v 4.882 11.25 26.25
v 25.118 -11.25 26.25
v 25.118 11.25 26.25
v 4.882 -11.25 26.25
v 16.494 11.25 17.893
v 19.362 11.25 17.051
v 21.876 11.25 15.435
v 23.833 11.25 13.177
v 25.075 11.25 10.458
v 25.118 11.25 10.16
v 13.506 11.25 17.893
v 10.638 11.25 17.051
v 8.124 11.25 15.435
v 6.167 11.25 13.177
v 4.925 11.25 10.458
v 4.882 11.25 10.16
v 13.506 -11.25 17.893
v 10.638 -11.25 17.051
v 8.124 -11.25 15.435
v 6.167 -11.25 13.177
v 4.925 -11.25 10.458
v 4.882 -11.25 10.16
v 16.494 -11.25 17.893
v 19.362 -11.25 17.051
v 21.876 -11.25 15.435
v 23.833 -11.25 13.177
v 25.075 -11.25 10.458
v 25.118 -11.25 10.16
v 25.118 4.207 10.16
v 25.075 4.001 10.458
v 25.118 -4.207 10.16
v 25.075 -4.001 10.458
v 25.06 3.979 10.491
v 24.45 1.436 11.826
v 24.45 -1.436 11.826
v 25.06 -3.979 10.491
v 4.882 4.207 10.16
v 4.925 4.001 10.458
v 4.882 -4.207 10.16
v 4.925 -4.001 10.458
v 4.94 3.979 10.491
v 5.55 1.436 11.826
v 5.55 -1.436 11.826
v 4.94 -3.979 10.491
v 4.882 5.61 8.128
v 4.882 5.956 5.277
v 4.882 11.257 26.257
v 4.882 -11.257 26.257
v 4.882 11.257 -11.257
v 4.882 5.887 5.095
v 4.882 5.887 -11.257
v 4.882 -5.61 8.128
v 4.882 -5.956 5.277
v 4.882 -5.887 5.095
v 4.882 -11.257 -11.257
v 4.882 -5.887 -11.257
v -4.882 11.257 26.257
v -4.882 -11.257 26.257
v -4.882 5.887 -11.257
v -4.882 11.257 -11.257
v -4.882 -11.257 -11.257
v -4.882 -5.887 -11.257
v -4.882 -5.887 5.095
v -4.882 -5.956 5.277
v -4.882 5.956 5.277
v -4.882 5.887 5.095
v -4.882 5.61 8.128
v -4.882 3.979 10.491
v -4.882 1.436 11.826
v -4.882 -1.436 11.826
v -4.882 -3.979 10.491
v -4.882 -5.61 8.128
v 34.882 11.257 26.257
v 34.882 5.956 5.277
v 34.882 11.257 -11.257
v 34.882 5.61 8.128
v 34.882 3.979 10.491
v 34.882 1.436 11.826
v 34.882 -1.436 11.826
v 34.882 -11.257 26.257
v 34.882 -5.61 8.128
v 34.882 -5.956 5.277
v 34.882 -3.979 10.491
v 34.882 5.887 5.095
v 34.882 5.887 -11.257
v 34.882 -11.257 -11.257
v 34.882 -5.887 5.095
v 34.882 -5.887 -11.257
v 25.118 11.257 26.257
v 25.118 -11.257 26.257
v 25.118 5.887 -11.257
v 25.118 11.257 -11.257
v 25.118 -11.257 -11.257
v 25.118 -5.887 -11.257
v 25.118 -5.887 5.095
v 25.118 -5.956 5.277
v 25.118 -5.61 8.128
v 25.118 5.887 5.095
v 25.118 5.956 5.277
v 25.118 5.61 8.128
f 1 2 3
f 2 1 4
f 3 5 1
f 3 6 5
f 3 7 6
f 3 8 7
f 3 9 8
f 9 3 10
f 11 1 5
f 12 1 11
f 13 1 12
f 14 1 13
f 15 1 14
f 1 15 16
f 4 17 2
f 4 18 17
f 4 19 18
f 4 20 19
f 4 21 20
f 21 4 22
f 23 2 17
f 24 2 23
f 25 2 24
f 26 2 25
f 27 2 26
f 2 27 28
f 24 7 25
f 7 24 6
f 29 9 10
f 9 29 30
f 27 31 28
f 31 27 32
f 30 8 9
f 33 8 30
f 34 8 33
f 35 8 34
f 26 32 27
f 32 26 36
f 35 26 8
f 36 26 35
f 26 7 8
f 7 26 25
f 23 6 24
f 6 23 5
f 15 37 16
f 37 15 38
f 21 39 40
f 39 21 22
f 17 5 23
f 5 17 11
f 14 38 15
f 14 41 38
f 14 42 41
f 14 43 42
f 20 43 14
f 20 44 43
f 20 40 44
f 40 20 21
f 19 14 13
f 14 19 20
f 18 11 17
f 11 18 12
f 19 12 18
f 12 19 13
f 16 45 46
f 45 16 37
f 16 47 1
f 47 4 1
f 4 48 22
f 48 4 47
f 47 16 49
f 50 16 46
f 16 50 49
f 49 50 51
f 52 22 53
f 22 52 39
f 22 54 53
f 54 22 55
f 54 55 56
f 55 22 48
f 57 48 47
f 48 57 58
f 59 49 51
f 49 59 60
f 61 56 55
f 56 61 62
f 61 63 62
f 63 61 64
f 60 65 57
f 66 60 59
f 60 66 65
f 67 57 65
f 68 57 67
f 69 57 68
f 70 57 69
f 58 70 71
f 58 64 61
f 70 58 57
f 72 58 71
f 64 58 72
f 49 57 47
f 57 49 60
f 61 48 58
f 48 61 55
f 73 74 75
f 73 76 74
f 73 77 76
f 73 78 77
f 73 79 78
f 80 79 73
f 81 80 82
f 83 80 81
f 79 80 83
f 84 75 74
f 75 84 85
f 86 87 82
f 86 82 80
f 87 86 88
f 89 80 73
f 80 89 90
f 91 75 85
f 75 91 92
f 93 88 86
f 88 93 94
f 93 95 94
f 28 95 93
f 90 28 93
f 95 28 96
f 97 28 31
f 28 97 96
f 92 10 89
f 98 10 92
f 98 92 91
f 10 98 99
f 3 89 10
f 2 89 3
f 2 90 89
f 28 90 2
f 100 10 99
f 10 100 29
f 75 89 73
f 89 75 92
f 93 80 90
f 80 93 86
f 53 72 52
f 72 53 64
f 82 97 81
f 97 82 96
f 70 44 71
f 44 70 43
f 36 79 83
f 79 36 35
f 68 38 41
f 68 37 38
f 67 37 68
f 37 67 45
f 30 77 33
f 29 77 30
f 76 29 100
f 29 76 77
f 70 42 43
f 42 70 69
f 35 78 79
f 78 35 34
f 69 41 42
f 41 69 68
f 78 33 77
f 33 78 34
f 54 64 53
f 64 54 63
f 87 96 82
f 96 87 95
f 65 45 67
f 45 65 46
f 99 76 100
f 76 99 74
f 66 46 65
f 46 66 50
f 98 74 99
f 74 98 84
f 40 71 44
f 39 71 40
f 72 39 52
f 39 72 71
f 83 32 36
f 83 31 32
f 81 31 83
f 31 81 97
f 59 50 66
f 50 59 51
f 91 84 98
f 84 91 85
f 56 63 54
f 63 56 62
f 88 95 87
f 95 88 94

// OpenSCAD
scale(1.5,1.5,1.5)
difference() {
    union() {
        translate([0, 0, 5])
        color([0,0,1])
        cube([6.51, 15.01, 25.01], true);
            
        translate([20, 0, 5])
        color([1,0,0])
        cube([6.51, 15.01, 25.01], true);
        
        color([1,1,1]) {
            difference(){
                translate([10, 0, 10]) 
                rotate([0,90,0])
                cube([15, 15, 26], true);
                translate([10, 0, 5]) 
                rotate([90,0,0])
                cylinder(15.01, 7, 7, true);        
                translate([10, 0, -1])
                cube([13.86, 15, 14], true);
            }
        }
    }
    union() {
        translate([10, 0, 4]) rotate([0,90,0])
        cylinder(30, 4, 4, true);
        translate([10, 0, -2])
        cube([30, 7.85, 11.5], true);
    }
}
